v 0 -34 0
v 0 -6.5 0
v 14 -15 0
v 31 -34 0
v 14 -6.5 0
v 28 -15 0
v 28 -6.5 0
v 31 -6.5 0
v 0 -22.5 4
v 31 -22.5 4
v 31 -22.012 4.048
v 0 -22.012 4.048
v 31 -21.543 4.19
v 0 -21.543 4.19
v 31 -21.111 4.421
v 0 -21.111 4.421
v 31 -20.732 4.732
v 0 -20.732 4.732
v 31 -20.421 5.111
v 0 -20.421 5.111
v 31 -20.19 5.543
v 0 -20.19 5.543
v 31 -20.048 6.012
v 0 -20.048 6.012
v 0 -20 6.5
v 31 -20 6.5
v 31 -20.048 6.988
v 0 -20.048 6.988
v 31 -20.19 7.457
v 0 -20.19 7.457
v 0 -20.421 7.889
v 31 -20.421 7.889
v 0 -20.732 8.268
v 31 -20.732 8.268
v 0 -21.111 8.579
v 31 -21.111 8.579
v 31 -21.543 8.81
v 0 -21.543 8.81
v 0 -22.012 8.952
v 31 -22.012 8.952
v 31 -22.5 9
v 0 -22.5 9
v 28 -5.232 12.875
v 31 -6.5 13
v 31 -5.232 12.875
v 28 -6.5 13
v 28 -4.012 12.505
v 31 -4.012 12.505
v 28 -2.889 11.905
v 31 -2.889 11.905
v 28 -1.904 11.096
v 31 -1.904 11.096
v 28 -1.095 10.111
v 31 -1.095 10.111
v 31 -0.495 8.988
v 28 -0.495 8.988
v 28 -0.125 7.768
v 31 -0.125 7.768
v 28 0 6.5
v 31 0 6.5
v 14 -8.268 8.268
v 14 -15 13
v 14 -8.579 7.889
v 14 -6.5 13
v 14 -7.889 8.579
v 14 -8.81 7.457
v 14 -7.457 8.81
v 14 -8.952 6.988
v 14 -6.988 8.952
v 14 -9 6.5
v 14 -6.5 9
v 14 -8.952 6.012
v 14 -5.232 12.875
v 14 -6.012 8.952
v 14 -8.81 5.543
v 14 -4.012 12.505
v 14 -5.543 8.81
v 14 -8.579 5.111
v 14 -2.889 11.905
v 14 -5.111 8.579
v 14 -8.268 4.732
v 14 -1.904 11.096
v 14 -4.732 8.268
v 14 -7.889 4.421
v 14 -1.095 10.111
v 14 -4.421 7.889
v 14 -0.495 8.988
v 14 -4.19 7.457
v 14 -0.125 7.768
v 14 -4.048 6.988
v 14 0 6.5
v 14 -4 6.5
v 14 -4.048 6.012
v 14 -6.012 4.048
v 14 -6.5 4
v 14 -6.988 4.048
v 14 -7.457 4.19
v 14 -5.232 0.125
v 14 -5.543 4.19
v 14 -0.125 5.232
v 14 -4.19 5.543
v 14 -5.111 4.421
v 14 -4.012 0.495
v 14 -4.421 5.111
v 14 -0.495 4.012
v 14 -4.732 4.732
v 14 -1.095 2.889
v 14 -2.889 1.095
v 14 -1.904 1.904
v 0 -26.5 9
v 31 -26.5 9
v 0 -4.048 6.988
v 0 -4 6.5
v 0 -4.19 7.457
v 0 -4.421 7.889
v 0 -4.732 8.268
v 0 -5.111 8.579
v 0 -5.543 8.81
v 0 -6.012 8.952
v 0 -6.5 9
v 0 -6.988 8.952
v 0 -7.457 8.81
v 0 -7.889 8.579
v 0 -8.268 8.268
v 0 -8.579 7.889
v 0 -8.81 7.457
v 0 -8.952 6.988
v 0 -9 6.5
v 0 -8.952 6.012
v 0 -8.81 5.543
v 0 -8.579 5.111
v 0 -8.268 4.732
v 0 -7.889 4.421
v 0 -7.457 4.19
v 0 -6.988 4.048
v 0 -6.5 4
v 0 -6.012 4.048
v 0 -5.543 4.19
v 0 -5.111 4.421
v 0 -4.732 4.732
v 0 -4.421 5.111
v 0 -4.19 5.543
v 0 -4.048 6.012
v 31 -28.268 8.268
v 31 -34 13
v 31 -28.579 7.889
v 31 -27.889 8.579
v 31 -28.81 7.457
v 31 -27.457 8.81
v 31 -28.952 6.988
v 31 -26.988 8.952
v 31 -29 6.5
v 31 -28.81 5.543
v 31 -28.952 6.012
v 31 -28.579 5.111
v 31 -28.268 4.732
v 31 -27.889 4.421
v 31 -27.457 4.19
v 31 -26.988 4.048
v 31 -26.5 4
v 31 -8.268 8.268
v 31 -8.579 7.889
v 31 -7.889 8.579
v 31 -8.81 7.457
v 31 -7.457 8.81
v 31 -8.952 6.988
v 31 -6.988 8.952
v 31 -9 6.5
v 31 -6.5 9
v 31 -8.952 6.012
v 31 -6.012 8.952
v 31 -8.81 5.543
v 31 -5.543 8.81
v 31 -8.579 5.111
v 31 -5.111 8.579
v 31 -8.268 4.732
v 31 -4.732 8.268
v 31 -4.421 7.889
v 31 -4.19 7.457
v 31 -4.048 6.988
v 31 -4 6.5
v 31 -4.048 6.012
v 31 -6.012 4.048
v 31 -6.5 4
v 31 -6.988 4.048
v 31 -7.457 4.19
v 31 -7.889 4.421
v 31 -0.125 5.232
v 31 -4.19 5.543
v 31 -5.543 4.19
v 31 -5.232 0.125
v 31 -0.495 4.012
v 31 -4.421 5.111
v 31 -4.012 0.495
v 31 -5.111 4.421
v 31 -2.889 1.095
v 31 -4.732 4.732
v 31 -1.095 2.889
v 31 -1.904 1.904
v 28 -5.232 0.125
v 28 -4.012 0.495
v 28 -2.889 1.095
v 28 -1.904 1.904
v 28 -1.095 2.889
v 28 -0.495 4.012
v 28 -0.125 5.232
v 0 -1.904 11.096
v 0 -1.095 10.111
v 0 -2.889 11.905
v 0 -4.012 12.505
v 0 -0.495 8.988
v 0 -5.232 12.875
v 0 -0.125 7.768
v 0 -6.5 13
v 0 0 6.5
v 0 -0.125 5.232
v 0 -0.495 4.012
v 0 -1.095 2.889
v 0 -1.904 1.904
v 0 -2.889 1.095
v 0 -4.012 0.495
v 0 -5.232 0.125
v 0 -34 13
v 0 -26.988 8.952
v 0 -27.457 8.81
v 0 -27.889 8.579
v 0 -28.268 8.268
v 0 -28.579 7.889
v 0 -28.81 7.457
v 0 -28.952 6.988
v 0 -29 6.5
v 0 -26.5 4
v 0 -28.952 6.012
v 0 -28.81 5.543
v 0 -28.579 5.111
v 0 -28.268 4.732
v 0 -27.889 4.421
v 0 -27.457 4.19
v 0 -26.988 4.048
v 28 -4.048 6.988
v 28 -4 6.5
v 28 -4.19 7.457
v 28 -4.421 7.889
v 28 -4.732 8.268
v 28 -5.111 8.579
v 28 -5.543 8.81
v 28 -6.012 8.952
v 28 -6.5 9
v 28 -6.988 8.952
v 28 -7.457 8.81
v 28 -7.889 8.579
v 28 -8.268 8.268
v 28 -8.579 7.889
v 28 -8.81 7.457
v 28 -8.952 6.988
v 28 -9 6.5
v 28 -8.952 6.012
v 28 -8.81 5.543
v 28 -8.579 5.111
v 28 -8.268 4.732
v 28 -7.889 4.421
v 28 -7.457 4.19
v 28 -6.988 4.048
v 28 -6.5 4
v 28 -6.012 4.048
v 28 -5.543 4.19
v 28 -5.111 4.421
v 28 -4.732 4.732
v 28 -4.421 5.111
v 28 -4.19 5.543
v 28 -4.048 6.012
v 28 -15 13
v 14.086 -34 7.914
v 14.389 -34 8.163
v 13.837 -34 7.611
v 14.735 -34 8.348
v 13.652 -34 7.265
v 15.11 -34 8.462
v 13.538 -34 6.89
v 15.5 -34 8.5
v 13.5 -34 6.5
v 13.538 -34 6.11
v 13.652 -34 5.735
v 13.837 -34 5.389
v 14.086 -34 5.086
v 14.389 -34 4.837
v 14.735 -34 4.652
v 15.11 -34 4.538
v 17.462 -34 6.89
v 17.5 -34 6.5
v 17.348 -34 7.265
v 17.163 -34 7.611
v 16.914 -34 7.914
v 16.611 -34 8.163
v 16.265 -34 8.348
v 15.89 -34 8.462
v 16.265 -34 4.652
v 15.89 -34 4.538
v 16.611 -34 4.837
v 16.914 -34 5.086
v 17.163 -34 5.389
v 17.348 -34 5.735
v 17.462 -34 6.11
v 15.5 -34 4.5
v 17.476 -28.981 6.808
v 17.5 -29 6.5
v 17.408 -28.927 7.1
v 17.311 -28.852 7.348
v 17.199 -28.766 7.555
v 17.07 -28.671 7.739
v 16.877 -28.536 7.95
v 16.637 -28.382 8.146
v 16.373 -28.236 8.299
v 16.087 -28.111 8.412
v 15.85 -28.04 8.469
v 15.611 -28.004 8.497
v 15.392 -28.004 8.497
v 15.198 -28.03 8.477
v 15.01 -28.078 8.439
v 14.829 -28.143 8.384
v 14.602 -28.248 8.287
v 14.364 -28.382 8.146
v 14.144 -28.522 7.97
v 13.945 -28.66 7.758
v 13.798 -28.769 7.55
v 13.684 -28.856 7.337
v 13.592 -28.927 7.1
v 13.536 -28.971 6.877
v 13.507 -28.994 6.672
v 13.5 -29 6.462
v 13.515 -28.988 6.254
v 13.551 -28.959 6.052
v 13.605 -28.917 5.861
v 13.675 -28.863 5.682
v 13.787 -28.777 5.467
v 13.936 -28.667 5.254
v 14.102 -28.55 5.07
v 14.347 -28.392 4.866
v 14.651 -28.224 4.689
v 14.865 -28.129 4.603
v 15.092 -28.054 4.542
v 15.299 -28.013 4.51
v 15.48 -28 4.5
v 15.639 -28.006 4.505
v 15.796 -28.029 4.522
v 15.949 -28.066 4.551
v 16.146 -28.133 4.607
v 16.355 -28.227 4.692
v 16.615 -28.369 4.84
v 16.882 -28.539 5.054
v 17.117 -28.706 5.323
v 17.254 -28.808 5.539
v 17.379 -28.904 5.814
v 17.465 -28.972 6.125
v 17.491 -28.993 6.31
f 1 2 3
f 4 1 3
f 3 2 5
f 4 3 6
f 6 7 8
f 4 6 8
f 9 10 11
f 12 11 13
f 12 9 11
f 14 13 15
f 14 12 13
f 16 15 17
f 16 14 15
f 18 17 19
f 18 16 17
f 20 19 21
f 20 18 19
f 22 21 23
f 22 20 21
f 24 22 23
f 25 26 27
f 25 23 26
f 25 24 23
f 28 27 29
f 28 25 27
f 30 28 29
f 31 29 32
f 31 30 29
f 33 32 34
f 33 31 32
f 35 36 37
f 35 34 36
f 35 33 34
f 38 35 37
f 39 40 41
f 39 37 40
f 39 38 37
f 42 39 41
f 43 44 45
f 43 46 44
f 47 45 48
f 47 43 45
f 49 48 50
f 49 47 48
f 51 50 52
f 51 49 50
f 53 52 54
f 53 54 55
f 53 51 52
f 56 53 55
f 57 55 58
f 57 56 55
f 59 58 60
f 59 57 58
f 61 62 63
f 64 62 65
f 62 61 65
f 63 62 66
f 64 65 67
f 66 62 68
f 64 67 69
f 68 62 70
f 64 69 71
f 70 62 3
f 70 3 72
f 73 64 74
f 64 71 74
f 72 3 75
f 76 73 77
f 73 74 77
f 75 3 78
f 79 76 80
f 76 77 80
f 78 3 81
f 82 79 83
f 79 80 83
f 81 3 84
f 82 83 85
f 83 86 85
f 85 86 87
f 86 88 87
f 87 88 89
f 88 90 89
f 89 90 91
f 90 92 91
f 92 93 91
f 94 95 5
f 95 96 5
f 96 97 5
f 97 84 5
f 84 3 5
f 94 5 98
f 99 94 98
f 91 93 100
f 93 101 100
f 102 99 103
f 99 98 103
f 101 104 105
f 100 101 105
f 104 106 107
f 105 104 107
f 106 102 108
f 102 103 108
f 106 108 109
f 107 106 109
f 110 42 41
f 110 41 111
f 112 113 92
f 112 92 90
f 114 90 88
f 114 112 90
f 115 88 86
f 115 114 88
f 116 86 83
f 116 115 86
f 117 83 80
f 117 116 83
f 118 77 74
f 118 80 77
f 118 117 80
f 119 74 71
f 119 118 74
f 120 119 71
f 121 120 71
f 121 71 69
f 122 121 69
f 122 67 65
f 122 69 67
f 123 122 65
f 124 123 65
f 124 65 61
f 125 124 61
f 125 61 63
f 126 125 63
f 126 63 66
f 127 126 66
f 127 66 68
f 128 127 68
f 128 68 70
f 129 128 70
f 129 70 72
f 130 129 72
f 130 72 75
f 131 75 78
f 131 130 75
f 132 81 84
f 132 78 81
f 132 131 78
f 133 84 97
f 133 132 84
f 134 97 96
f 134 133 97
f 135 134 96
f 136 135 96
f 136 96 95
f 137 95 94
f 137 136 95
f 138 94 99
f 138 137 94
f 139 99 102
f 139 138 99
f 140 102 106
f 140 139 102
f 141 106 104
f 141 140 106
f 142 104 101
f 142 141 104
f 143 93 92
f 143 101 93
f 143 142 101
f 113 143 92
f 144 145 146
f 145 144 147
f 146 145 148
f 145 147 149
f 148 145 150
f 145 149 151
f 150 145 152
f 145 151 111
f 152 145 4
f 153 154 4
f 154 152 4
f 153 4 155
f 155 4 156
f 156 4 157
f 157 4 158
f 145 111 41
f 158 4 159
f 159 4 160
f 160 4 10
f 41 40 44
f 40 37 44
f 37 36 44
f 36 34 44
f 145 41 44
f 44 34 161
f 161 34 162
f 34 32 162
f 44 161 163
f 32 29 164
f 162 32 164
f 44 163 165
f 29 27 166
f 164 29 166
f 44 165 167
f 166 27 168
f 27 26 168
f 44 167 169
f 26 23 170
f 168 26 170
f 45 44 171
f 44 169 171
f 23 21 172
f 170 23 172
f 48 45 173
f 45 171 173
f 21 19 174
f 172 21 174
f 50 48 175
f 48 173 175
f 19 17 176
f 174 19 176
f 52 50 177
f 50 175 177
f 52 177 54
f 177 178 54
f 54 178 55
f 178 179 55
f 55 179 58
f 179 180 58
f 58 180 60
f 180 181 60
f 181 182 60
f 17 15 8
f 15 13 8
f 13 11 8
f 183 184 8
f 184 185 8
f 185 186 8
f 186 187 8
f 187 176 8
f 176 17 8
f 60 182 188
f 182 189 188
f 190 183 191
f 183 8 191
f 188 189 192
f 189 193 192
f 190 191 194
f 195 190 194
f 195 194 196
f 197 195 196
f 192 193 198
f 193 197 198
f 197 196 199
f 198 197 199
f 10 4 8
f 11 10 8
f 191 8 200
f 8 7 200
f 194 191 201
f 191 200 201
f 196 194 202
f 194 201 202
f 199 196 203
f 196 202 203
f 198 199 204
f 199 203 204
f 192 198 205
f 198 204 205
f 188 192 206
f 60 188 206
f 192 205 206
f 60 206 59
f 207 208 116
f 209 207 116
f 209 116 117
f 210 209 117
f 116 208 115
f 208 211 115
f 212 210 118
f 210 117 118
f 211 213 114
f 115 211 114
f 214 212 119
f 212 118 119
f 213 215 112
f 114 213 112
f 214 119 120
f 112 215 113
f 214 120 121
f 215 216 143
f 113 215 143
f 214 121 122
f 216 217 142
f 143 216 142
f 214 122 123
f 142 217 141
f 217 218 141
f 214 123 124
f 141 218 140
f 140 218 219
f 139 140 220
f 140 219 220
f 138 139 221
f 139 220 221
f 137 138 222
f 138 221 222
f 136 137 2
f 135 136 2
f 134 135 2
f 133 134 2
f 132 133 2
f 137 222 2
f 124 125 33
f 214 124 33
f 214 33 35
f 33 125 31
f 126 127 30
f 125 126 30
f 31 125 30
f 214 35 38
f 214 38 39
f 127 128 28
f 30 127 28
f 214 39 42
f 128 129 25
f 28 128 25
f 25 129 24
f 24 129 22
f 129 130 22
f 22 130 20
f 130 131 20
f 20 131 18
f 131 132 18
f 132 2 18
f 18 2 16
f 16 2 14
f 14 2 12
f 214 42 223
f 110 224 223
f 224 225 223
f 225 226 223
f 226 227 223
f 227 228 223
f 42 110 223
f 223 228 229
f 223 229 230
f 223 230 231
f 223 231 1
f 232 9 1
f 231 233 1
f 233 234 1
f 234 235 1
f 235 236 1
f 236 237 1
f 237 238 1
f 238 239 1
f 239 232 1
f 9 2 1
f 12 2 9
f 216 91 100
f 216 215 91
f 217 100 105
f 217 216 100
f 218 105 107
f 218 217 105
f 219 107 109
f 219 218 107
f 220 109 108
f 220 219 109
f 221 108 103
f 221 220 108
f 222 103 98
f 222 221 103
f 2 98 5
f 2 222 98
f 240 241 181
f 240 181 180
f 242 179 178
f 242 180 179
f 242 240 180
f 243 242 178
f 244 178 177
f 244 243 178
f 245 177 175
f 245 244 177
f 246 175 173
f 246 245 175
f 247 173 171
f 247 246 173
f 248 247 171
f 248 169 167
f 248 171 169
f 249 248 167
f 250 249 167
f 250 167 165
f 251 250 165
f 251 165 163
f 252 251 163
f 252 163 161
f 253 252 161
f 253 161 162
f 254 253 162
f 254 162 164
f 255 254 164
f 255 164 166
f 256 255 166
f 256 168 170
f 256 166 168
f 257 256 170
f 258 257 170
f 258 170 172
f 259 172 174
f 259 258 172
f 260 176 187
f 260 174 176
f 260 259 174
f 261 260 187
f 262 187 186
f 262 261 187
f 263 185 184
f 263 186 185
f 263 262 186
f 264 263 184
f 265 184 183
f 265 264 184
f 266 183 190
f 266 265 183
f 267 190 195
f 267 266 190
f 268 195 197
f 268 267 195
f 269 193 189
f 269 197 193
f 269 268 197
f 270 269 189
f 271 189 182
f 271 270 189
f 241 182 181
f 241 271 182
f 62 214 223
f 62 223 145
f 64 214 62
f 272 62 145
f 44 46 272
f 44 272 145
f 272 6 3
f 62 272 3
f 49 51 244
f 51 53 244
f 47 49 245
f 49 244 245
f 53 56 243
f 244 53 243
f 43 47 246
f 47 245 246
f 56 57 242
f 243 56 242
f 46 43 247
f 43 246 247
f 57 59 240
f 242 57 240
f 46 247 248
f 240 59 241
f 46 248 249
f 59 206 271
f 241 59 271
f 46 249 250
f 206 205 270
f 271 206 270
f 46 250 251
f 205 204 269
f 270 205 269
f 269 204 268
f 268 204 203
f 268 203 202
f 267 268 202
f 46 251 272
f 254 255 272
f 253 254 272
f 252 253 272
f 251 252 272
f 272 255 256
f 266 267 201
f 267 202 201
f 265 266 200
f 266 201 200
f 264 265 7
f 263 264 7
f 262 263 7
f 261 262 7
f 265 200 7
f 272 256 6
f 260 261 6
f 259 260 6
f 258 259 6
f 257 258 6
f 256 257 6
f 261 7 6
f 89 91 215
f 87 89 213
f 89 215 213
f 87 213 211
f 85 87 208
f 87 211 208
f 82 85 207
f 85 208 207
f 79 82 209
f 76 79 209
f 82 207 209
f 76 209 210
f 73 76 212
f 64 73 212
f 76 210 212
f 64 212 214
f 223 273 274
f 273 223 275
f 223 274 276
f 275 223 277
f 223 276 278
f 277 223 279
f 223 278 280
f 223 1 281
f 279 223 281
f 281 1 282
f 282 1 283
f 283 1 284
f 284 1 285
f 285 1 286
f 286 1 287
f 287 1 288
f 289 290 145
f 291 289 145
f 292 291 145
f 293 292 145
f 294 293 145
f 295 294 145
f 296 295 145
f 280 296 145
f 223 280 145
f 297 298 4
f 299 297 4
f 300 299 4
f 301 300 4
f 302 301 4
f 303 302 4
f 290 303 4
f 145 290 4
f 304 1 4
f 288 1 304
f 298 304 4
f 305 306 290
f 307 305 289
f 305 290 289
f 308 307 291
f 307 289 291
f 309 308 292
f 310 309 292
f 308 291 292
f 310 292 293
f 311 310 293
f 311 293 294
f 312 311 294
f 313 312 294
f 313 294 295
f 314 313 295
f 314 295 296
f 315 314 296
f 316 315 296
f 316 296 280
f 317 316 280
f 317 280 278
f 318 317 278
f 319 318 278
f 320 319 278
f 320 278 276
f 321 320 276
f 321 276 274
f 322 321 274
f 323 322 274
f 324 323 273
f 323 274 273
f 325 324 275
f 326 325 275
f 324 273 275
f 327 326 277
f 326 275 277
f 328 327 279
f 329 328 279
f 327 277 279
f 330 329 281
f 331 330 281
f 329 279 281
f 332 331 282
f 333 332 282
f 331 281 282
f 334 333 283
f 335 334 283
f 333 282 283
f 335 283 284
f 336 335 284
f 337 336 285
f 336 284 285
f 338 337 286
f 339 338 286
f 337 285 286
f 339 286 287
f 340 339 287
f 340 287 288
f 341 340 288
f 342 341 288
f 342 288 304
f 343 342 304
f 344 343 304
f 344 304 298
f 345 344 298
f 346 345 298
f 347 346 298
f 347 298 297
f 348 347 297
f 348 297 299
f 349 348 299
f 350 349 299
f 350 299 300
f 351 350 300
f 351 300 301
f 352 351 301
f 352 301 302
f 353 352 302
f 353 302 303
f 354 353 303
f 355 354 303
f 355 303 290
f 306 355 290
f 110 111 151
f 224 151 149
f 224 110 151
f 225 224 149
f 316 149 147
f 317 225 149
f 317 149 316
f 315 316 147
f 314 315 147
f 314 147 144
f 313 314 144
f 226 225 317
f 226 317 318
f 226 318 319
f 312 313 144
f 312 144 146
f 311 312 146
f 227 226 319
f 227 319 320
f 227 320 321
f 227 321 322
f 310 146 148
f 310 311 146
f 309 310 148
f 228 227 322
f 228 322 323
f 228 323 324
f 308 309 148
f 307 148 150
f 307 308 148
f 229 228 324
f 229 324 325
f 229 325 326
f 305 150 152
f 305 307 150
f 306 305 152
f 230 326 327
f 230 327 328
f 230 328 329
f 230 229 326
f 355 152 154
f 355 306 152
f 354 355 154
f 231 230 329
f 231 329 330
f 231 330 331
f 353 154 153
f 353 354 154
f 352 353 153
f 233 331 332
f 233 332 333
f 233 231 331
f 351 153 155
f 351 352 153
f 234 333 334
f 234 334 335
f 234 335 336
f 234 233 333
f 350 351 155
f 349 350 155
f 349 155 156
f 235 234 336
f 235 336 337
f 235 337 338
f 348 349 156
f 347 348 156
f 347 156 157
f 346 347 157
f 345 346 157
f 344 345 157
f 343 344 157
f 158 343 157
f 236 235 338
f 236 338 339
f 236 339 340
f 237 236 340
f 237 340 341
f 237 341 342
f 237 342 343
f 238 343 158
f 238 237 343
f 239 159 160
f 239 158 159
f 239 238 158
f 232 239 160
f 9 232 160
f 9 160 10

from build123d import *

# Parameters (mm, degrees)
BOSS_EXTRUDE1_DEPTH     = 13
CUT_EXTRUDE1_DEPTH      = 48.812132352
CUT_EXTRUDE2_DEPTH      = 48.812132352
CUT_EXTRUDE2_DEPTH_BACK = 48.812132352
SKETCH5_R               = 2.5
FILLET1_R               = 6.5
SKETCH6_R               = 2
CUT_EXTRUDE3_DEPTH      = 8


with BuildPart() as part:
    # Sketch2 → Boss-Extrude1 (new body)
    with BuildSketch(Plane.XY):
        Polygon((0, 0), (0, -34), (31, -34), (31, 0), (28, 0), (28, -15), (14, -15), (14, 0), align=None)
    extrude(amount=BOSS_EXTRUDE1_DEPTH)

    # Sketch4 → Cut-Extrude1 (cut, through all)
    with BuildSketch(Plane.ZY):
        with BuildLine():
            Line((4, -26.5), (4, -22.5))
            ThreePointArc((4, -22.5), (6.5, -20), (9, -22.5))
            Line((9, -22.5), (9, -26.5))
            ThreePointArc((9, -26.5), (6.5, -29), (4, -26.5))
        make_face()
    extrude(amount=-CUT_EXTRUDE1_DEPTH, mode=Mode.SUBTRACT)

    # Sketch5 → Cut-Extrude2 (cut, two sides: drawn at the far end of the back side and taken through both)
    with BuildSketch(Plane(origin=(31, 0, 0), x_dir=(0, 0, -1), z_dir=(1, 0, 0)).offset(-CUT_EXTRUDE2_DEPTH_BACK)):
        with Locations(Location((-6.5, -6.5, 0), (0, 0, 90))):
            Circle(SKETCH5_R)
    extrude(amount=CUT_EXTRUDE2_DEPTH + CUT_EXTRUDE2_DEPTH_BACK, mode=Mode.SUBTRACT)

    # Fillet1
    fillet1_edges = [part.edges().sort_by_distance(p)[0] for p in [
        (29.5, 0, 13),
        (7, 0, 13),
        (7, 0, 0),
        (29.5, 0, 0),
    ]]
    fillet(fillet1_edges, radius=FILLET1_R - 0.0001)  # a hair under: the kernel refuses the full size

    # Sketch6 → Cut-Extrude3 (cut)
    with BuildSketch(Plane.XZ.offset(34)):
        with Locations((15.5, 6.5)):
            Circle(SKETCH6_R)
    extrude(amount=-CUT_EXTRUDE3_DEPTH, mode=Mode.SUBTRACT)


solid = part.part
